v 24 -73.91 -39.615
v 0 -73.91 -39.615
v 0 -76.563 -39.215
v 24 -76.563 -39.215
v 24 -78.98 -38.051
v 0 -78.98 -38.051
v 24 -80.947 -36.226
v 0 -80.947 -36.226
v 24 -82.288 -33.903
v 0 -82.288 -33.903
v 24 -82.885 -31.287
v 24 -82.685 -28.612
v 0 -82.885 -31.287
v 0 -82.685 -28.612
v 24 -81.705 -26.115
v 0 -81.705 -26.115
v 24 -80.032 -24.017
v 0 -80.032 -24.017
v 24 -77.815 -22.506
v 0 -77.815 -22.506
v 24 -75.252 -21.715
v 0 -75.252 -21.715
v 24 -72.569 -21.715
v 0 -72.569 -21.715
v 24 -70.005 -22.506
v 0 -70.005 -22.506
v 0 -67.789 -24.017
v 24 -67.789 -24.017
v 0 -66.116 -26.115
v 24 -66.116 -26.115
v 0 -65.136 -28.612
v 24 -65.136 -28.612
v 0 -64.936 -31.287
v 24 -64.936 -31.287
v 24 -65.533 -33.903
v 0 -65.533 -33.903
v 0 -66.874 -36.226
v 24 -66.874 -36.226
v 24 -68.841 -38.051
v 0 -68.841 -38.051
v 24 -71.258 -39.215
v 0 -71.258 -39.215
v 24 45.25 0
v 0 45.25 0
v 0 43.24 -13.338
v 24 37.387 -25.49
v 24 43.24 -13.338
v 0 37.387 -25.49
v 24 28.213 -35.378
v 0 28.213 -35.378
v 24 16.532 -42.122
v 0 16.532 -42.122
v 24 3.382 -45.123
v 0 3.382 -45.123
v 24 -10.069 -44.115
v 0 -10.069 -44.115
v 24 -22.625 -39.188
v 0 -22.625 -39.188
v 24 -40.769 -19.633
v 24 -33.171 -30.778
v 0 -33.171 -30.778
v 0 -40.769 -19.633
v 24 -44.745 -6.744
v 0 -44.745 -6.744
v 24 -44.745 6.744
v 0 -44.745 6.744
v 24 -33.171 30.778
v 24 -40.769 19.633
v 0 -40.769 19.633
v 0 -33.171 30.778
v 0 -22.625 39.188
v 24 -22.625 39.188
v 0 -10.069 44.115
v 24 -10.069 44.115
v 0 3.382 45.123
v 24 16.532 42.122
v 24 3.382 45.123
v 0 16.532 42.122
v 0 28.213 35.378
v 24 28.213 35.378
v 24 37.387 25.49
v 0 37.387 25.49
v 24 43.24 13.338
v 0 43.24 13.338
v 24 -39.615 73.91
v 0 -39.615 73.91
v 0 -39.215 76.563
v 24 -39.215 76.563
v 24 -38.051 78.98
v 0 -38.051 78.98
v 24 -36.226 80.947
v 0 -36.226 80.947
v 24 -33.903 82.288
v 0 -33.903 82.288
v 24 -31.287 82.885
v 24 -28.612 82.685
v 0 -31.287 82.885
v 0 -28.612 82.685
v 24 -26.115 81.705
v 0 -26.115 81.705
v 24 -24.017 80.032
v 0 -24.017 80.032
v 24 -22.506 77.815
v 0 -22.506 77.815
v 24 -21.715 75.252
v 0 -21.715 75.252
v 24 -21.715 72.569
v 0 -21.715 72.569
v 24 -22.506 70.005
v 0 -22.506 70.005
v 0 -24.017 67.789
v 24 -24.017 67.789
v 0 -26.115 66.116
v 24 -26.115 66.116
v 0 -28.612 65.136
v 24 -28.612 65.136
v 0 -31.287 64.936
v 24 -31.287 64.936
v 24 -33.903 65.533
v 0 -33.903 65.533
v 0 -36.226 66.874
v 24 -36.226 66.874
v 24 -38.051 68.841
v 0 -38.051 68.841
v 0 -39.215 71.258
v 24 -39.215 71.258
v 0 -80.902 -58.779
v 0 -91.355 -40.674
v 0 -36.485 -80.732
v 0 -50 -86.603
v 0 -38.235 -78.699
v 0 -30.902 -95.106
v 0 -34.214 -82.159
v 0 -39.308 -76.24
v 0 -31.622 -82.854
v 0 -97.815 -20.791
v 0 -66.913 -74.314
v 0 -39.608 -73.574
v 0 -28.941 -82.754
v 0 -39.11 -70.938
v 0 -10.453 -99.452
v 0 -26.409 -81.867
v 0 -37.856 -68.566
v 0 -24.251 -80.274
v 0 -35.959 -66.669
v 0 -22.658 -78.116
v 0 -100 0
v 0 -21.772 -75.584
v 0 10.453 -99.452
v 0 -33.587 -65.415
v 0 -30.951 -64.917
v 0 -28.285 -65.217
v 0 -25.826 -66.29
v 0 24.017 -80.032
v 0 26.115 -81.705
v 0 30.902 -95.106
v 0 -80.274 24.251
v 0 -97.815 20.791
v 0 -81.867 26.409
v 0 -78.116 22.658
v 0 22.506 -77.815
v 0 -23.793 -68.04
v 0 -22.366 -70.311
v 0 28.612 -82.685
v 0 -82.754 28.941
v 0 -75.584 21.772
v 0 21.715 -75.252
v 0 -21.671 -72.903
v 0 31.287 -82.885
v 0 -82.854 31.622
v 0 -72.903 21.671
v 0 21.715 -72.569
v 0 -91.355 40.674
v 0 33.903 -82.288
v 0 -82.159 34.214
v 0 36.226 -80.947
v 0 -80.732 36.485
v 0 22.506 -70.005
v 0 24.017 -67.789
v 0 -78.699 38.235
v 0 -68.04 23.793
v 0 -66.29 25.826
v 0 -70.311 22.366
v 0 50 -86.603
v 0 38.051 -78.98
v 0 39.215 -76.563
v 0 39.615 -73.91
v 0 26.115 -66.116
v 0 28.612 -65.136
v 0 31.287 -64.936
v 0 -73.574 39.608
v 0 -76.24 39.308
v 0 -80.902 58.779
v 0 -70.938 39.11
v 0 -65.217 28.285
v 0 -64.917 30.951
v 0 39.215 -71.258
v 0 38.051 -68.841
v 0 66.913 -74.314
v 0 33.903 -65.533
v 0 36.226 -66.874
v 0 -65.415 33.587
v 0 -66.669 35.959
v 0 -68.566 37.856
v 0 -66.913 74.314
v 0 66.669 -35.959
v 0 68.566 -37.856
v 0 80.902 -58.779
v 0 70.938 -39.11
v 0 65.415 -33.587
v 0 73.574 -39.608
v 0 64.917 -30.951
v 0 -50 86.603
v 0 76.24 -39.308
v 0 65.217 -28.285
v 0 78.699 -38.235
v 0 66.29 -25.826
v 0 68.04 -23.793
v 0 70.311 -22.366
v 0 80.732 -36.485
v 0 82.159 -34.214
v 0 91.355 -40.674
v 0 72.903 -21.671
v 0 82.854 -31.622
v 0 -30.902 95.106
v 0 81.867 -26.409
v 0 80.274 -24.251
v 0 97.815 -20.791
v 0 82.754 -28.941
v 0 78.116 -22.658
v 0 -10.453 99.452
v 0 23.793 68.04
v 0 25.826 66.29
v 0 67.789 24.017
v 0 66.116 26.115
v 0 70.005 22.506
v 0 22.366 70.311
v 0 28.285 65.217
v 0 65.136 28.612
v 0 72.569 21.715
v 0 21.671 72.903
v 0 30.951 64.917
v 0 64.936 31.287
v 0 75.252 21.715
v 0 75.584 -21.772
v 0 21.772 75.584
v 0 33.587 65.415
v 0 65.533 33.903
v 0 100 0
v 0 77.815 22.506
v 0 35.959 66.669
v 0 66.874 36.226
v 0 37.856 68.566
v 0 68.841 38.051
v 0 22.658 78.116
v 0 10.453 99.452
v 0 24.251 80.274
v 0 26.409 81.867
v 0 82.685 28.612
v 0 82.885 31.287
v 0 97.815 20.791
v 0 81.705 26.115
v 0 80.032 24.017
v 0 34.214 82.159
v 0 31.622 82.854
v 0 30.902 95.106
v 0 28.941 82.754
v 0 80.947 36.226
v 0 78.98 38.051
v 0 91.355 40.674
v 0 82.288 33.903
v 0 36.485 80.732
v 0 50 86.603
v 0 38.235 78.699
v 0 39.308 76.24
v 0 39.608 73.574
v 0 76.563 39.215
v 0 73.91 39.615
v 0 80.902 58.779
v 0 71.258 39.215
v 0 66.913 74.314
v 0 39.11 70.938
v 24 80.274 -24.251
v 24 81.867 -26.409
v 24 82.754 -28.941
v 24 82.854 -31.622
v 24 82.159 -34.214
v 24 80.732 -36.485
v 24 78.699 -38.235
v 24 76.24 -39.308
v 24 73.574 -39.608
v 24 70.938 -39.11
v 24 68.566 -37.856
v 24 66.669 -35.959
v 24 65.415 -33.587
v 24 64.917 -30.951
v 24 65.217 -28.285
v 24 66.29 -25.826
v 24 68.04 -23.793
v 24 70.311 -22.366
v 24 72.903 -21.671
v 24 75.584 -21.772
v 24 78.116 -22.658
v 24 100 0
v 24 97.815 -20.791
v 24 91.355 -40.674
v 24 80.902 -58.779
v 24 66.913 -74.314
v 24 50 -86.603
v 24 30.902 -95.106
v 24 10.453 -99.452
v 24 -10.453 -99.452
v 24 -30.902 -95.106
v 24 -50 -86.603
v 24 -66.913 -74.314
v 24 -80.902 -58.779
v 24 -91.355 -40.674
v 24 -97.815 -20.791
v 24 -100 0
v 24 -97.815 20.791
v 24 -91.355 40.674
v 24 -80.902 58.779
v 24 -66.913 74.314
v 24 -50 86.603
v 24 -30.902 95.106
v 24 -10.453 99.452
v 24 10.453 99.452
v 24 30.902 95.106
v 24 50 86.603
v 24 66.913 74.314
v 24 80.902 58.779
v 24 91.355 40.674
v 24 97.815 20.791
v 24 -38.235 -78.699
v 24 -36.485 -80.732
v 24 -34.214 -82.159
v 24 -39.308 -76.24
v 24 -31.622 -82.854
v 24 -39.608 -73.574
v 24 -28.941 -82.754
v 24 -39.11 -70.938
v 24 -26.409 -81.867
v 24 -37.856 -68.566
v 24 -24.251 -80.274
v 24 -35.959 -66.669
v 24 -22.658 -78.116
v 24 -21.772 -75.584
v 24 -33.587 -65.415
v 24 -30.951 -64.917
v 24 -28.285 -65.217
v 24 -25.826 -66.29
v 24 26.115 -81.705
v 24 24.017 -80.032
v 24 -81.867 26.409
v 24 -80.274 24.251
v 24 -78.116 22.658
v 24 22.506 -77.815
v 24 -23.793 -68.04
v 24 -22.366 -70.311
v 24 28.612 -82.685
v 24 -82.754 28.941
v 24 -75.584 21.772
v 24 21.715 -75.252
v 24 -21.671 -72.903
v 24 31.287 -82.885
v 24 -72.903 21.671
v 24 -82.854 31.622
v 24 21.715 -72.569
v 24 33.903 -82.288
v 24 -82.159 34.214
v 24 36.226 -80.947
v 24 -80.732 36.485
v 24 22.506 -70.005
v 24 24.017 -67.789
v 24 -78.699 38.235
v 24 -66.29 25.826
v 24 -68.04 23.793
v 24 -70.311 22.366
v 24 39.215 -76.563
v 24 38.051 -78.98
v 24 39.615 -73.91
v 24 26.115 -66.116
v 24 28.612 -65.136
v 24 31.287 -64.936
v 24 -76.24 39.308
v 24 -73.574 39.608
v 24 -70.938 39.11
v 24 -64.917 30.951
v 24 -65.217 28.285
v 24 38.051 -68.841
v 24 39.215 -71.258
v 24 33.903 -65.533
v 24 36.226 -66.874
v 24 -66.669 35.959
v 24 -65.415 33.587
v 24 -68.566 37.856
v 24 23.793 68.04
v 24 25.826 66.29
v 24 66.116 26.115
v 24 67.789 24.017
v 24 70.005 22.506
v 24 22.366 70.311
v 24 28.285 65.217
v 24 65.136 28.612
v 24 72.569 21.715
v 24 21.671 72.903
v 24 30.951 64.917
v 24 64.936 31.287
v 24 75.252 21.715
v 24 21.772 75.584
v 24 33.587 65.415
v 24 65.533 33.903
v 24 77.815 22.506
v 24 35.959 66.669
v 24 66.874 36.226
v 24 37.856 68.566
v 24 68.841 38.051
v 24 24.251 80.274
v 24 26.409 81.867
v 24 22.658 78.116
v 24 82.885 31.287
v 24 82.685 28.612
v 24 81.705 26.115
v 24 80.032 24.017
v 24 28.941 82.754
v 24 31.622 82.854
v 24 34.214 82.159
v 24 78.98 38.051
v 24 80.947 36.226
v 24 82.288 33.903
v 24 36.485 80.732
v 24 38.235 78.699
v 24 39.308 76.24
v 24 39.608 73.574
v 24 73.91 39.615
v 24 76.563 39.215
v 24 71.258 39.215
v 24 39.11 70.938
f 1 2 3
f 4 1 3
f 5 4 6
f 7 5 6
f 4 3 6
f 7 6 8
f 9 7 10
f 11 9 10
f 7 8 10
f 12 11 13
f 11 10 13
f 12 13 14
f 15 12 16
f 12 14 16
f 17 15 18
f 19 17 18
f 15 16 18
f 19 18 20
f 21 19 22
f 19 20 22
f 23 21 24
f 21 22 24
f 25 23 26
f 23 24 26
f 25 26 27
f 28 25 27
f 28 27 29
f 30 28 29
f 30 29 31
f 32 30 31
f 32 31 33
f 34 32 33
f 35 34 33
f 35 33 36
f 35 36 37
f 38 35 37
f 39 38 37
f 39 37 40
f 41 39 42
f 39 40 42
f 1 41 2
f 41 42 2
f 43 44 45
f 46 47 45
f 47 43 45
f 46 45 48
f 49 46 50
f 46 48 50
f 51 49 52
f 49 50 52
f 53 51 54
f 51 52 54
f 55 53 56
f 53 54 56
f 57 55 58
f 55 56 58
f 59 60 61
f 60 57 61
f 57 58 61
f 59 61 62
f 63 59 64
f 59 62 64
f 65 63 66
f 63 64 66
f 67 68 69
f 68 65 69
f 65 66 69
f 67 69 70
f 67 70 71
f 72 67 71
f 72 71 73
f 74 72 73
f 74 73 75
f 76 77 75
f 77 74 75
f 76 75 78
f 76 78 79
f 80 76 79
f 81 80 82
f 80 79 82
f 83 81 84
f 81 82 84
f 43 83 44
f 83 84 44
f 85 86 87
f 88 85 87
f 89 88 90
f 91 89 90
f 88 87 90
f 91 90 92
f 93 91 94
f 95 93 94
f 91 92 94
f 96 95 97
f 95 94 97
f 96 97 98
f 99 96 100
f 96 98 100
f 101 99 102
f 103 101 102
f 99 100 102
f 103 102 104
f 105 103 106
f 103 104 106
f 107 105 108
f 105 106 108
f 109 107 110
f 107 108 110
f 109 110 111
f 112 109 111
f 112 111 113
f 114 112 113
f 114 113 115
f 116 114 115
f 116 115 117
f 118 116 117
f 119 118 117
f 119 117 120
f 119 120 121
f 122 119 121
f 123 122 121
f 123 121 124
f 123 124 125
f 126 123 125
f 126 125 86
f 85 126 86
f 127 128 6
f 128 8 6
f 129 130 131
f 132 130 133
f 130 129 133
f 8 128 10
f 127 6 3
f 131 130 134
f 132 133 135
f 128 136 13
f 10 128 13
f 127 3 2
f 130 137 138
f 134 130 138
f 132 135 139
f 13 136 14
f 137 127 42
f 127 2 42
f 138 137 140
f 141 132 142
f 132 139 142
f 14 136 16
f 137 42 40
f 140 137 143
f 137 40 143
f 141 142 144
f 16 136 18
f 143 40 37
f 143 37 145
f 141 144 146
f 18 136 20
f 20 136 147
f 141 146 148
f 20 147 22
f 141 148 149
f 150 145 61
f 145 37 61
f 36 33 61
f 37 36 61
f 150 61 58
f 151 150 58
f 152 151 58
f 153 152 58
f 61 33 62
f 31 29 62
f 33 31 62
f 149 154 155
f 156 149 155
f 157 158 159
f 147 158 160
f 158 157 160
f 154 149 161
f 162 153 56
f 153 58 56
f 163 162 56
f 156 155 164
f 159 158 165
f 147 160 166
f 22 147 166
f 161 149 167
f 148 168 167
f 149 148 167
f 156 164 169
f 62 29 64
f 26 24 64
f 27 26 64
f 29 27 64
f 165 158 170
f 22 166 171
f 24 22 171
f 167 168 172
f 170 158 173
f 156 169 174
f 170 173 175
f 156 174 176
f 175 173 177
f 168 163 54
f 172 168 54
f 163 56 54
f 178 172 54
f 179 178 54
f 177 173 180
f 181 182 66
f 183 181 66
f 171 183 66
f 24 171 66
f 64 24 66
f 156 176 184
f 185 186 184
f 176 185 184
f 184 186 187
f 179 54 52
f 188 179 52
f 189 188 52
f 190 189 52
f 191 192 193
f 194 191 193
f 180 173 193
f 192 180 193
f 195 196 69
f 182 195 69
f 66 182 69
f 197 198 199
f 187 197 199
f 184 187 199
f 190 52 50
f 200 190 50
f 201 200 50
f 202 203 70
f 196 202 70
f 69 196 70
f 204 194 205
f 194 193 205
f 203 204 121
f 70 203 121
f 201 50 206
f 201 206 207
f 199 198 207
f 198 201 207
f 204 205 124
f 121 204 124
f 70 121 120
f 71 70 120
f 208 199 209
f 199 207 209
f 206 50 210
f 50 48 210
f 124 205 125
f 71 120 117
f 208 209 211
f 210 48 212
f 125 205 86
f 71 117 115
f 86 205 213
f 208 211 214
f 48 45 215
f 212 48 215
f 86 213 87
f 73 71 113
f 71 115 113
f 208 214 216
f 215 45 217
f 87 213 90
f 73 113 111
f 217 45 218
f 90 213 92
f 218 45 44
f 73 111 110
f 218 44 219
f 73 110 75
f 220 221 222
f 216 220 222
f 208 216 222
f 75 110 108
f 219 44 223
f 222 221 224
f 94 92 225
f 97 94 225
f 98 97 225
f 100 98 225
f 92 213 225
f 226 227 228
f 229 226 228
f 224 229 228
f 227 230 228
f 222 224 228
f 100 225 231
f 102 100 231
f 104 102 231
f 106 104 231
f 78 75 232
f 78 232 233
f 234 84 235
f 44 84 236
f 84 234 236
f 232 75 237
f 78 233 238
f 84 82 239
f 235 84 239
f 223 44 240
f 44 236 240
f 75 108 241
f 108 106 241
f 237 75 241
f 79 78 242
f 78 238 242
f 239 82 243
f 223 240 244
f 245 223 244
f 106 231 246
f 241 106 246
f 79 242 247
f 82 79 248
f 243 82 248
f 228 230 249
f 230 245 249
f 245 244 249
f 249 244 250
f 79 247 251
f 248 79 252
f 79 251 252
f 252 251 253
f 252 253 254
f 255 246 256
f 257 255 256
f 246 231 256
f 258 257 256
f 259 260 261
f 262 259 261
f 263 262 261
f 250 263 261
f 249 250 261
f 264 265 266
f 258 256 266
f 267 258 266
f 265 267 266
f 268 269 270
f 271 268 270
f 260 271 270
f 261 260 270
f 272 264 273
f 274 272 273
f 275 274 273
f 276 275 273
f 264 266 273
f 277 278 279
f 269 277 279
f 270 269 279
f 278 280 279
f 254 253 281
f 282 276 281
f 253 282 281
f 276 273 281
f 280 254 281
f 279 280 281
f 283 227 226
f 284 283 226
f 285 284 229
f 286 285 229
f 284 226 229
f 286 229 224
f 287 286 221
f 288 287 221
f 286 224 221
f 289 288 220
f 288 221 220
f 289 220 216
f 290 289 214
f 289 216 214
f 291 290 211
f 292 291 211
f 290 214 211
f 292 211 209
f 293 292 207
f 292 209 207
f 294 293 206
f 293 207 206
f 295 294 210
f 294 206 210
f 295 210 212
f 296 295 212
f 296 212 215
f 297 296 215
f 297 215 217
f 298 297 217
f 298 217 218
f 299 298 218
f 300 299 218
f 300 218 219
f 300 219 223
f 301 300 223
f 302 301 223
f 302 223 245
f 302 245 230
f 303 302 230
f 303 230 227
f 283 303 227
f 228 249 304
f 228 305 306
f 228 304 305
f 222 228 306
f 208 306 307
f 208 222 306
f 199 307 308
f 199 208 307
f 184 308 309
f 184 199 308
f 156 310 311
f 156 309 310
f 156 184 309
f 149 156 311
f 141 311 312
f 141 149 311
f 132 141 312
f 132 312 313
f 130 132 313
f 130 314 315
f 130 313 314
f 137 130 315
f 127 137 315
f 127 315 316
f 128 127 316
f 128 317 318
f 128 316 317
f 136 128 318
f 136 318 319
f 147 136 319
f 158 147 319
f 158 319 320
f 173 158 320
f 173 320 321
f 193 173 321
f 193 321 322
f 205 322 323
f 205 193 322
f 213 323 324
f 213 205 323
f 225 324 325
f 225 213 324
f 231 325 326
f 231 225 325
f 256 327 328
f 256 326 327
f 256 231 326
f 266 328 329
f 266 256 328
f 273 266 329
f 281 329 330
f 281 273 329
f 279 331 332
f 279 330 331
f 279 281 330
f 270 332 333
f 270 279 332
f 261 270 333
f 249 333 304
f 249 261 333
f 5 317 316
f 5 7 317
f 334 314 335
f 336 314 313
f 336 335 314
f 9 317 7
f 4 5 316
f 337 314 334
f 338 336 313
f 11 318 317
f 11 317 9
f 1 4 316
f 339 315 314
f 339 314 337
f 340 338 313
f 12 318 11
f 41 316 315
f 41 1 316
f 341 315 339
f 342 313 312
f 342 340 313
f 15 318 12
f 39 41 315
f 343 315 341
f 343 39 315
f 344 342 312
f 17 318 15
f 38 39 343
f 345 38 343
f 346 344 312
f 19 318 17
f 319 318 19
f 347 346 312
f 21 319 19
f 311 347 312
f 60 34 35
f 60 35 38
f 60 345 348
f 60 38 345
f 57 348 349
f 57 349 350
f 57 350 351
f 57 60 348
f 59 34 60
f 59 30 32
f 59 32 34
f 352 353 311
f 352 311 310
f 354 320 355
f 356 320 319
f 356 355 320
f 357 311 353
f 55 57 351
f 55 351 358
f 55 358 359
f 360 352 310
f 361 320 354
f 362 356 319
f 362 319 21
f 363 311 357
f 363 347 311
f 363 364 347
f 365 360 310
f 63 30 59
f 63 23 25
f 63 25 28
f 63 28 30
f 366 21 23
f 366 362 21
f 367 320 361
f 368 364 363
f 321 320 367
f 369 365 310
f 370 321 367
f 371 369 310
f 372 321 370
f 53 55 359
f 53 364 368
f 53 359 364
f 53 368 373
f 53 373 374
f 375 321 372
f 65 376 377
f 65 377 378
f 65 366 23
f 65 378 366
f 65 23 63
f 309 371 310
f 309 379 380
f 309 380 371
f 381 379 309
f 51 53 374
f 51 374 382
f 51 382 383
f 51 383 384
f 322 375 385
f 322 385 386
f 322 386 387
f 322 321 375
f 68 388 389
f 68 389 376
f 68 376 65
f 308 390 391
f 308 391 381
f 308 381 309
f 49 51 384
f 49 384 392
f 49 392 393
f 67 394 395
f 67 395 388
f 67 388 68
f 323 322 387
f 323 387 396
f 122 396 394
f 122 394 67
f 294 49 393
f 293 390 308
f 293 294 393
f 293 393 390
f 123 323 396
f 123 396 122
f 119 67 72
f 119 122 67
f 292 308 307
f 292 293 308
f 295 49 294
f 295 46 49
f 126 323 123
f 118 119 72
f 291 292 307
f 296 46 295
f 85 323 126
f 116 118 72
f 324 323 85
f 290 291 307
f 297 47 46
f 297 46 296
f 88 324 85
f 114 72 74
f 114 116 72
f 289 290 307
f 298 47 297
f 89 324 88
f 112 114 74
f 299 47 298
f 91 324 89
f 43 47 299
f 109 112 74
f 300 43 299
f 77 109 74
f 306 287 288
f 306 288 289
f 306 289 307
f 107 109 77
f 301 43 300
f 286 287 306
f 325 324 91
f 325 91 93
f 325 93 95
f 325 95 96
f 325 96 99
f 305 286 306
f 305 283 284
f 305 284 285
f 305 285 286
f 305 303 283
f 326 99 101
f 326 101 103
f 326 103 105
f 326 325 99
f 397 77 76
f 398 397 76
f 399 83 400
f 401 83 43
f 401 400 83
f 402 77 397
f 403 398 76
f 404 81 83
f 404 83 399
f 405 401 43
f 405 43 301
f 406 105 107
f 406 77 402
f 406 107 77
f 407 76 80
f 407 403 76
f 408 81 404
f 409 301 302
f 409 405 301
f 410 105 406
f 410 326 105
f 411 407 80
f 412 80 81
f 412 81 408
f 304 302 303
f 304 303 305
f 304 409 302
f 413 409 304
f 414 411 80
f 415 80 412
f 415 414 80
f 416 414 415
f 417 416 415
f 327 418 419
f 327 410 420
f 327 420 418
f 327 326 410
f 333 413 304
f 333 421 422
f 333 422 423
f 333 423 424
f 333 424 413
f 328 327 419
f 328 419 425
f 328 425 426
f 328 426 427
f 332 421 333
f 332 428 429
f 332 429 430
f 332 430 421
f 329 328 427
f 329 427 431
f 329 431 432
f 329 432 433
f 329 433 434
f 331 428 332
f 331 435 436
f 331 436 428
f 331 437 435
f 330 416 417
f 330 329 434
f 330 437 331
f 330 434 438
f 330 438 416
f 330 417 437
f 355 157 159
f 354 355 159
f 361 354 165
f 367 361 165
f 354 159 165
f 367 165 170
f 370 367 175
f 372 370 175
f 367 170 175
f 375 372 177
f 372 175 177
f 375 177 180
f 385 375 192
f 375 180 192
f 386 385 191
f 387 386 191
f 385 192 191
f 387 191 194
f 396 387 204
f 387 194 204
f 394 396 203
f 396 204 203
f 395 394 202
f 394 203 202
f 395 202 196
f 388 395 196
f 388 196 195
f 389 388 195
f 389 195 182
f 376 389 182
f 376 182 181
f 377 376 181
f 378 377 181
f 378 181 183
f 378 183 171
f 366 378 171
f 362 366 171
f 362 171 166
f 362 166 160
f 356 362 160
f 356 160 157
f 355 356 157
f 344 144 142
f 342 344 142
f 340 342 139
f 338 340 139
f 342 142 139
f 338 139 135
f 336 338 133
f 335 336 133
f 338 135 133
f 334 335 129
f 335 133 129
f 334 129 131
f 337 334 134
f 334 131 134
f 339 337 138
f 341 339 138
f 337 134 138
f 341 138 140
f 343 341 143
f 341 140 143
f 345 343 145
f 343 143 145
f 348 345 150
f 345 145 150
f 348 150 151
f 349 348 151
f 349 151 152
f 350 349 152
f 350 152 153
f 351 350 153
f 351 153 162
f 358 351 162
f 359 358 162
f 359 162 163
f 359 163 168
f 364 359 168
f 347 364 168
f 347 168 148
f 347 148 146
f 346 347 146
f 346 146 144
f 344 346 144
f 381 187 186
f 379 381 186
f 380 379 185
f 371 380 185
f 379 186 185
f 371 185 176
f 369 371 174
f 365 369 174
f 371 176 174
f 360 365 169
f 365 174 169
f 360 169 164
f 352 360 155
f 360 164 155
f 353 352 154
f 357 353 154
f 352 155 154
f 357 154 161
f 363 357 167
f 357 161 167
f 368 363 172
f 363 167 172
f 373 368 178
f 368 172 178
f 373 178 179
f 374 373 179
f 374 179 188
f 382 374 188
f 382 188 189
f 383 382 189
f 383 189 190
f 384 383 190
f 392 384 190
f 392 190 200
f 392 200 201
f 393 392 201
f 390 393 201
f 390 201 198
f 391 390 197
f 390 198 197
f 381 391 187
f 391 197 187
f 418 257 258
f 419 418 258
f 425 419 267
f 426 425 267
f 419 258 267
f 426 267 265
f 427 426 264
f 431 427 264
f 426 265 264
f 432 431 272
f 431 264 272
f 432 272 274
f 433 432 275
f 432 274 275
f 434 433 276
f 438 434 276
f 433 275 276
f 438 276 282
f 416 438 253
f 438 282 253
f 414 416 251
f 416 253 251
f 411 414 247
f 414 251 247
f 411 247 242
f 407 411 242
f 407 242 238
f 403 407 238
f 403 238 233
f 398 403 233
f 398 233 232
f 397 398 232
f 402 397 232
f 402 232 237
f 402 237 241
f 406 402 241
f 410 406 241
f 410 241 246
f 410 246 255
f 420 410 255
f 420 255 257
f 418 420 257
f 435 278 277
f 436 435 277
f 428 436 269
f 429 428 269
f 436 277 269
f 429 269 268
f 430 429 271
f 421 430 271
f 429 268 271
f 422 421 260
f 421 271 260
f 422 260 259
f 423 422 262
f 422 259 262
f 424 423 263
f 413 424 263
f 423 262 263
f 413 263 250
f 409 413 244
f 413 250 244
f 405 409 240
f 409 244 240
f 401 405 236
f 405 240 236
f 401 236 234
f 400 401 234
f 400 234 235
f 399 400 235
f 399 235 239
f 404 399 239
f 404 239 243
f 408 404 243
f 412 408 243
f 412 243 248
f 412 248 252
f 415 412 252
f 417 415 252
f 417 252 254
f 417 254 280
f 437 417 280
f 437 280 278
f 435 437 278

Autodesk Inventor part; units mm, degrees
ref_plane "YZ Plane" through (0, 0, 0) normal (1, 0, 0) x (0, 1, 0)
ref_plane "XZ Plane" through (0, 0, 0) normal (0, 1, 0) x (-1, 0, 0)
ref_plane "XY Plane" through (0, 0, 0) normal (0, 0, 1) x (1, 0, 0)
sketch "Sketch1" plane through (0, 0, 0) normal (0, 0, 1) x (1, 0, 0)
  line L0 (24, 100) -> (0, 100)
  line L1 (0, 100) -> (0, 45.25)
  line L2 (0, 45.25) -> (0, 0) construction
  line L3 (0, 0) -> (24, 0) construction
  line L4 (24, 100) -> (24, 45.25)
  line L5 (24, 45.25) -> (0, 45.25)
  line L6 (24, 45.25) -> (24, 0) construction
  dimension "d0" = 200
  dimension "d1" = 24
  dimension "d5" = 90.5
revolve "Revolution1" add sketch "Sketch1" angle 360 about axis through (0, 0, 0) along (1, 0, 0)
sketch "Sketch2" plane through (0, 0, 0) normal (-1, 0, 0) x (0, 0, 1)
  circle A0 centre (0, 0) radius 45.25 projected
  line L0 (0, 80) -> (0, 0) construction
  circle A1 centre (0, 0) radius 100 projected
  circle A2 centre (0, 0) radius 80 construction
  line L1 (0, 0) -> (30.6147, 73.9104) construction
  circle A3 centre (30.6147, 73.9104) radius 9
  dimension "d6" = 18
  dimension "d7" = 80
  dimension "d8" = 22.5
extrude "Extrusion1" cut sketch "Sketch2" against normal through all contours A3
pattern_circular "Circular Pattern1" count 8 over 360 about axis through (12, 0, 0) along (1, 0, 0) of "Extrusion1"
equation "\"d6\" = dd2"
equation "\"d7\" = 0.5 * k"
equation "\"d0\" = D"
equation "\"d1\" = b"
equation "\"d5\" = dd5"
equation "\"b\" = 24"
equation "\"D\" = 200"
equation "\"dd2\" = 18"
equation "\"dd5\" = 90.5"
equation "\"Size_Designation\" = 1.2345"
equation "\"k\" = 160"
properties part number "DIN EN 1092-1 Plate Flange for Welding Type 01 - PN 25 80 x 88.9" material "Steel"
